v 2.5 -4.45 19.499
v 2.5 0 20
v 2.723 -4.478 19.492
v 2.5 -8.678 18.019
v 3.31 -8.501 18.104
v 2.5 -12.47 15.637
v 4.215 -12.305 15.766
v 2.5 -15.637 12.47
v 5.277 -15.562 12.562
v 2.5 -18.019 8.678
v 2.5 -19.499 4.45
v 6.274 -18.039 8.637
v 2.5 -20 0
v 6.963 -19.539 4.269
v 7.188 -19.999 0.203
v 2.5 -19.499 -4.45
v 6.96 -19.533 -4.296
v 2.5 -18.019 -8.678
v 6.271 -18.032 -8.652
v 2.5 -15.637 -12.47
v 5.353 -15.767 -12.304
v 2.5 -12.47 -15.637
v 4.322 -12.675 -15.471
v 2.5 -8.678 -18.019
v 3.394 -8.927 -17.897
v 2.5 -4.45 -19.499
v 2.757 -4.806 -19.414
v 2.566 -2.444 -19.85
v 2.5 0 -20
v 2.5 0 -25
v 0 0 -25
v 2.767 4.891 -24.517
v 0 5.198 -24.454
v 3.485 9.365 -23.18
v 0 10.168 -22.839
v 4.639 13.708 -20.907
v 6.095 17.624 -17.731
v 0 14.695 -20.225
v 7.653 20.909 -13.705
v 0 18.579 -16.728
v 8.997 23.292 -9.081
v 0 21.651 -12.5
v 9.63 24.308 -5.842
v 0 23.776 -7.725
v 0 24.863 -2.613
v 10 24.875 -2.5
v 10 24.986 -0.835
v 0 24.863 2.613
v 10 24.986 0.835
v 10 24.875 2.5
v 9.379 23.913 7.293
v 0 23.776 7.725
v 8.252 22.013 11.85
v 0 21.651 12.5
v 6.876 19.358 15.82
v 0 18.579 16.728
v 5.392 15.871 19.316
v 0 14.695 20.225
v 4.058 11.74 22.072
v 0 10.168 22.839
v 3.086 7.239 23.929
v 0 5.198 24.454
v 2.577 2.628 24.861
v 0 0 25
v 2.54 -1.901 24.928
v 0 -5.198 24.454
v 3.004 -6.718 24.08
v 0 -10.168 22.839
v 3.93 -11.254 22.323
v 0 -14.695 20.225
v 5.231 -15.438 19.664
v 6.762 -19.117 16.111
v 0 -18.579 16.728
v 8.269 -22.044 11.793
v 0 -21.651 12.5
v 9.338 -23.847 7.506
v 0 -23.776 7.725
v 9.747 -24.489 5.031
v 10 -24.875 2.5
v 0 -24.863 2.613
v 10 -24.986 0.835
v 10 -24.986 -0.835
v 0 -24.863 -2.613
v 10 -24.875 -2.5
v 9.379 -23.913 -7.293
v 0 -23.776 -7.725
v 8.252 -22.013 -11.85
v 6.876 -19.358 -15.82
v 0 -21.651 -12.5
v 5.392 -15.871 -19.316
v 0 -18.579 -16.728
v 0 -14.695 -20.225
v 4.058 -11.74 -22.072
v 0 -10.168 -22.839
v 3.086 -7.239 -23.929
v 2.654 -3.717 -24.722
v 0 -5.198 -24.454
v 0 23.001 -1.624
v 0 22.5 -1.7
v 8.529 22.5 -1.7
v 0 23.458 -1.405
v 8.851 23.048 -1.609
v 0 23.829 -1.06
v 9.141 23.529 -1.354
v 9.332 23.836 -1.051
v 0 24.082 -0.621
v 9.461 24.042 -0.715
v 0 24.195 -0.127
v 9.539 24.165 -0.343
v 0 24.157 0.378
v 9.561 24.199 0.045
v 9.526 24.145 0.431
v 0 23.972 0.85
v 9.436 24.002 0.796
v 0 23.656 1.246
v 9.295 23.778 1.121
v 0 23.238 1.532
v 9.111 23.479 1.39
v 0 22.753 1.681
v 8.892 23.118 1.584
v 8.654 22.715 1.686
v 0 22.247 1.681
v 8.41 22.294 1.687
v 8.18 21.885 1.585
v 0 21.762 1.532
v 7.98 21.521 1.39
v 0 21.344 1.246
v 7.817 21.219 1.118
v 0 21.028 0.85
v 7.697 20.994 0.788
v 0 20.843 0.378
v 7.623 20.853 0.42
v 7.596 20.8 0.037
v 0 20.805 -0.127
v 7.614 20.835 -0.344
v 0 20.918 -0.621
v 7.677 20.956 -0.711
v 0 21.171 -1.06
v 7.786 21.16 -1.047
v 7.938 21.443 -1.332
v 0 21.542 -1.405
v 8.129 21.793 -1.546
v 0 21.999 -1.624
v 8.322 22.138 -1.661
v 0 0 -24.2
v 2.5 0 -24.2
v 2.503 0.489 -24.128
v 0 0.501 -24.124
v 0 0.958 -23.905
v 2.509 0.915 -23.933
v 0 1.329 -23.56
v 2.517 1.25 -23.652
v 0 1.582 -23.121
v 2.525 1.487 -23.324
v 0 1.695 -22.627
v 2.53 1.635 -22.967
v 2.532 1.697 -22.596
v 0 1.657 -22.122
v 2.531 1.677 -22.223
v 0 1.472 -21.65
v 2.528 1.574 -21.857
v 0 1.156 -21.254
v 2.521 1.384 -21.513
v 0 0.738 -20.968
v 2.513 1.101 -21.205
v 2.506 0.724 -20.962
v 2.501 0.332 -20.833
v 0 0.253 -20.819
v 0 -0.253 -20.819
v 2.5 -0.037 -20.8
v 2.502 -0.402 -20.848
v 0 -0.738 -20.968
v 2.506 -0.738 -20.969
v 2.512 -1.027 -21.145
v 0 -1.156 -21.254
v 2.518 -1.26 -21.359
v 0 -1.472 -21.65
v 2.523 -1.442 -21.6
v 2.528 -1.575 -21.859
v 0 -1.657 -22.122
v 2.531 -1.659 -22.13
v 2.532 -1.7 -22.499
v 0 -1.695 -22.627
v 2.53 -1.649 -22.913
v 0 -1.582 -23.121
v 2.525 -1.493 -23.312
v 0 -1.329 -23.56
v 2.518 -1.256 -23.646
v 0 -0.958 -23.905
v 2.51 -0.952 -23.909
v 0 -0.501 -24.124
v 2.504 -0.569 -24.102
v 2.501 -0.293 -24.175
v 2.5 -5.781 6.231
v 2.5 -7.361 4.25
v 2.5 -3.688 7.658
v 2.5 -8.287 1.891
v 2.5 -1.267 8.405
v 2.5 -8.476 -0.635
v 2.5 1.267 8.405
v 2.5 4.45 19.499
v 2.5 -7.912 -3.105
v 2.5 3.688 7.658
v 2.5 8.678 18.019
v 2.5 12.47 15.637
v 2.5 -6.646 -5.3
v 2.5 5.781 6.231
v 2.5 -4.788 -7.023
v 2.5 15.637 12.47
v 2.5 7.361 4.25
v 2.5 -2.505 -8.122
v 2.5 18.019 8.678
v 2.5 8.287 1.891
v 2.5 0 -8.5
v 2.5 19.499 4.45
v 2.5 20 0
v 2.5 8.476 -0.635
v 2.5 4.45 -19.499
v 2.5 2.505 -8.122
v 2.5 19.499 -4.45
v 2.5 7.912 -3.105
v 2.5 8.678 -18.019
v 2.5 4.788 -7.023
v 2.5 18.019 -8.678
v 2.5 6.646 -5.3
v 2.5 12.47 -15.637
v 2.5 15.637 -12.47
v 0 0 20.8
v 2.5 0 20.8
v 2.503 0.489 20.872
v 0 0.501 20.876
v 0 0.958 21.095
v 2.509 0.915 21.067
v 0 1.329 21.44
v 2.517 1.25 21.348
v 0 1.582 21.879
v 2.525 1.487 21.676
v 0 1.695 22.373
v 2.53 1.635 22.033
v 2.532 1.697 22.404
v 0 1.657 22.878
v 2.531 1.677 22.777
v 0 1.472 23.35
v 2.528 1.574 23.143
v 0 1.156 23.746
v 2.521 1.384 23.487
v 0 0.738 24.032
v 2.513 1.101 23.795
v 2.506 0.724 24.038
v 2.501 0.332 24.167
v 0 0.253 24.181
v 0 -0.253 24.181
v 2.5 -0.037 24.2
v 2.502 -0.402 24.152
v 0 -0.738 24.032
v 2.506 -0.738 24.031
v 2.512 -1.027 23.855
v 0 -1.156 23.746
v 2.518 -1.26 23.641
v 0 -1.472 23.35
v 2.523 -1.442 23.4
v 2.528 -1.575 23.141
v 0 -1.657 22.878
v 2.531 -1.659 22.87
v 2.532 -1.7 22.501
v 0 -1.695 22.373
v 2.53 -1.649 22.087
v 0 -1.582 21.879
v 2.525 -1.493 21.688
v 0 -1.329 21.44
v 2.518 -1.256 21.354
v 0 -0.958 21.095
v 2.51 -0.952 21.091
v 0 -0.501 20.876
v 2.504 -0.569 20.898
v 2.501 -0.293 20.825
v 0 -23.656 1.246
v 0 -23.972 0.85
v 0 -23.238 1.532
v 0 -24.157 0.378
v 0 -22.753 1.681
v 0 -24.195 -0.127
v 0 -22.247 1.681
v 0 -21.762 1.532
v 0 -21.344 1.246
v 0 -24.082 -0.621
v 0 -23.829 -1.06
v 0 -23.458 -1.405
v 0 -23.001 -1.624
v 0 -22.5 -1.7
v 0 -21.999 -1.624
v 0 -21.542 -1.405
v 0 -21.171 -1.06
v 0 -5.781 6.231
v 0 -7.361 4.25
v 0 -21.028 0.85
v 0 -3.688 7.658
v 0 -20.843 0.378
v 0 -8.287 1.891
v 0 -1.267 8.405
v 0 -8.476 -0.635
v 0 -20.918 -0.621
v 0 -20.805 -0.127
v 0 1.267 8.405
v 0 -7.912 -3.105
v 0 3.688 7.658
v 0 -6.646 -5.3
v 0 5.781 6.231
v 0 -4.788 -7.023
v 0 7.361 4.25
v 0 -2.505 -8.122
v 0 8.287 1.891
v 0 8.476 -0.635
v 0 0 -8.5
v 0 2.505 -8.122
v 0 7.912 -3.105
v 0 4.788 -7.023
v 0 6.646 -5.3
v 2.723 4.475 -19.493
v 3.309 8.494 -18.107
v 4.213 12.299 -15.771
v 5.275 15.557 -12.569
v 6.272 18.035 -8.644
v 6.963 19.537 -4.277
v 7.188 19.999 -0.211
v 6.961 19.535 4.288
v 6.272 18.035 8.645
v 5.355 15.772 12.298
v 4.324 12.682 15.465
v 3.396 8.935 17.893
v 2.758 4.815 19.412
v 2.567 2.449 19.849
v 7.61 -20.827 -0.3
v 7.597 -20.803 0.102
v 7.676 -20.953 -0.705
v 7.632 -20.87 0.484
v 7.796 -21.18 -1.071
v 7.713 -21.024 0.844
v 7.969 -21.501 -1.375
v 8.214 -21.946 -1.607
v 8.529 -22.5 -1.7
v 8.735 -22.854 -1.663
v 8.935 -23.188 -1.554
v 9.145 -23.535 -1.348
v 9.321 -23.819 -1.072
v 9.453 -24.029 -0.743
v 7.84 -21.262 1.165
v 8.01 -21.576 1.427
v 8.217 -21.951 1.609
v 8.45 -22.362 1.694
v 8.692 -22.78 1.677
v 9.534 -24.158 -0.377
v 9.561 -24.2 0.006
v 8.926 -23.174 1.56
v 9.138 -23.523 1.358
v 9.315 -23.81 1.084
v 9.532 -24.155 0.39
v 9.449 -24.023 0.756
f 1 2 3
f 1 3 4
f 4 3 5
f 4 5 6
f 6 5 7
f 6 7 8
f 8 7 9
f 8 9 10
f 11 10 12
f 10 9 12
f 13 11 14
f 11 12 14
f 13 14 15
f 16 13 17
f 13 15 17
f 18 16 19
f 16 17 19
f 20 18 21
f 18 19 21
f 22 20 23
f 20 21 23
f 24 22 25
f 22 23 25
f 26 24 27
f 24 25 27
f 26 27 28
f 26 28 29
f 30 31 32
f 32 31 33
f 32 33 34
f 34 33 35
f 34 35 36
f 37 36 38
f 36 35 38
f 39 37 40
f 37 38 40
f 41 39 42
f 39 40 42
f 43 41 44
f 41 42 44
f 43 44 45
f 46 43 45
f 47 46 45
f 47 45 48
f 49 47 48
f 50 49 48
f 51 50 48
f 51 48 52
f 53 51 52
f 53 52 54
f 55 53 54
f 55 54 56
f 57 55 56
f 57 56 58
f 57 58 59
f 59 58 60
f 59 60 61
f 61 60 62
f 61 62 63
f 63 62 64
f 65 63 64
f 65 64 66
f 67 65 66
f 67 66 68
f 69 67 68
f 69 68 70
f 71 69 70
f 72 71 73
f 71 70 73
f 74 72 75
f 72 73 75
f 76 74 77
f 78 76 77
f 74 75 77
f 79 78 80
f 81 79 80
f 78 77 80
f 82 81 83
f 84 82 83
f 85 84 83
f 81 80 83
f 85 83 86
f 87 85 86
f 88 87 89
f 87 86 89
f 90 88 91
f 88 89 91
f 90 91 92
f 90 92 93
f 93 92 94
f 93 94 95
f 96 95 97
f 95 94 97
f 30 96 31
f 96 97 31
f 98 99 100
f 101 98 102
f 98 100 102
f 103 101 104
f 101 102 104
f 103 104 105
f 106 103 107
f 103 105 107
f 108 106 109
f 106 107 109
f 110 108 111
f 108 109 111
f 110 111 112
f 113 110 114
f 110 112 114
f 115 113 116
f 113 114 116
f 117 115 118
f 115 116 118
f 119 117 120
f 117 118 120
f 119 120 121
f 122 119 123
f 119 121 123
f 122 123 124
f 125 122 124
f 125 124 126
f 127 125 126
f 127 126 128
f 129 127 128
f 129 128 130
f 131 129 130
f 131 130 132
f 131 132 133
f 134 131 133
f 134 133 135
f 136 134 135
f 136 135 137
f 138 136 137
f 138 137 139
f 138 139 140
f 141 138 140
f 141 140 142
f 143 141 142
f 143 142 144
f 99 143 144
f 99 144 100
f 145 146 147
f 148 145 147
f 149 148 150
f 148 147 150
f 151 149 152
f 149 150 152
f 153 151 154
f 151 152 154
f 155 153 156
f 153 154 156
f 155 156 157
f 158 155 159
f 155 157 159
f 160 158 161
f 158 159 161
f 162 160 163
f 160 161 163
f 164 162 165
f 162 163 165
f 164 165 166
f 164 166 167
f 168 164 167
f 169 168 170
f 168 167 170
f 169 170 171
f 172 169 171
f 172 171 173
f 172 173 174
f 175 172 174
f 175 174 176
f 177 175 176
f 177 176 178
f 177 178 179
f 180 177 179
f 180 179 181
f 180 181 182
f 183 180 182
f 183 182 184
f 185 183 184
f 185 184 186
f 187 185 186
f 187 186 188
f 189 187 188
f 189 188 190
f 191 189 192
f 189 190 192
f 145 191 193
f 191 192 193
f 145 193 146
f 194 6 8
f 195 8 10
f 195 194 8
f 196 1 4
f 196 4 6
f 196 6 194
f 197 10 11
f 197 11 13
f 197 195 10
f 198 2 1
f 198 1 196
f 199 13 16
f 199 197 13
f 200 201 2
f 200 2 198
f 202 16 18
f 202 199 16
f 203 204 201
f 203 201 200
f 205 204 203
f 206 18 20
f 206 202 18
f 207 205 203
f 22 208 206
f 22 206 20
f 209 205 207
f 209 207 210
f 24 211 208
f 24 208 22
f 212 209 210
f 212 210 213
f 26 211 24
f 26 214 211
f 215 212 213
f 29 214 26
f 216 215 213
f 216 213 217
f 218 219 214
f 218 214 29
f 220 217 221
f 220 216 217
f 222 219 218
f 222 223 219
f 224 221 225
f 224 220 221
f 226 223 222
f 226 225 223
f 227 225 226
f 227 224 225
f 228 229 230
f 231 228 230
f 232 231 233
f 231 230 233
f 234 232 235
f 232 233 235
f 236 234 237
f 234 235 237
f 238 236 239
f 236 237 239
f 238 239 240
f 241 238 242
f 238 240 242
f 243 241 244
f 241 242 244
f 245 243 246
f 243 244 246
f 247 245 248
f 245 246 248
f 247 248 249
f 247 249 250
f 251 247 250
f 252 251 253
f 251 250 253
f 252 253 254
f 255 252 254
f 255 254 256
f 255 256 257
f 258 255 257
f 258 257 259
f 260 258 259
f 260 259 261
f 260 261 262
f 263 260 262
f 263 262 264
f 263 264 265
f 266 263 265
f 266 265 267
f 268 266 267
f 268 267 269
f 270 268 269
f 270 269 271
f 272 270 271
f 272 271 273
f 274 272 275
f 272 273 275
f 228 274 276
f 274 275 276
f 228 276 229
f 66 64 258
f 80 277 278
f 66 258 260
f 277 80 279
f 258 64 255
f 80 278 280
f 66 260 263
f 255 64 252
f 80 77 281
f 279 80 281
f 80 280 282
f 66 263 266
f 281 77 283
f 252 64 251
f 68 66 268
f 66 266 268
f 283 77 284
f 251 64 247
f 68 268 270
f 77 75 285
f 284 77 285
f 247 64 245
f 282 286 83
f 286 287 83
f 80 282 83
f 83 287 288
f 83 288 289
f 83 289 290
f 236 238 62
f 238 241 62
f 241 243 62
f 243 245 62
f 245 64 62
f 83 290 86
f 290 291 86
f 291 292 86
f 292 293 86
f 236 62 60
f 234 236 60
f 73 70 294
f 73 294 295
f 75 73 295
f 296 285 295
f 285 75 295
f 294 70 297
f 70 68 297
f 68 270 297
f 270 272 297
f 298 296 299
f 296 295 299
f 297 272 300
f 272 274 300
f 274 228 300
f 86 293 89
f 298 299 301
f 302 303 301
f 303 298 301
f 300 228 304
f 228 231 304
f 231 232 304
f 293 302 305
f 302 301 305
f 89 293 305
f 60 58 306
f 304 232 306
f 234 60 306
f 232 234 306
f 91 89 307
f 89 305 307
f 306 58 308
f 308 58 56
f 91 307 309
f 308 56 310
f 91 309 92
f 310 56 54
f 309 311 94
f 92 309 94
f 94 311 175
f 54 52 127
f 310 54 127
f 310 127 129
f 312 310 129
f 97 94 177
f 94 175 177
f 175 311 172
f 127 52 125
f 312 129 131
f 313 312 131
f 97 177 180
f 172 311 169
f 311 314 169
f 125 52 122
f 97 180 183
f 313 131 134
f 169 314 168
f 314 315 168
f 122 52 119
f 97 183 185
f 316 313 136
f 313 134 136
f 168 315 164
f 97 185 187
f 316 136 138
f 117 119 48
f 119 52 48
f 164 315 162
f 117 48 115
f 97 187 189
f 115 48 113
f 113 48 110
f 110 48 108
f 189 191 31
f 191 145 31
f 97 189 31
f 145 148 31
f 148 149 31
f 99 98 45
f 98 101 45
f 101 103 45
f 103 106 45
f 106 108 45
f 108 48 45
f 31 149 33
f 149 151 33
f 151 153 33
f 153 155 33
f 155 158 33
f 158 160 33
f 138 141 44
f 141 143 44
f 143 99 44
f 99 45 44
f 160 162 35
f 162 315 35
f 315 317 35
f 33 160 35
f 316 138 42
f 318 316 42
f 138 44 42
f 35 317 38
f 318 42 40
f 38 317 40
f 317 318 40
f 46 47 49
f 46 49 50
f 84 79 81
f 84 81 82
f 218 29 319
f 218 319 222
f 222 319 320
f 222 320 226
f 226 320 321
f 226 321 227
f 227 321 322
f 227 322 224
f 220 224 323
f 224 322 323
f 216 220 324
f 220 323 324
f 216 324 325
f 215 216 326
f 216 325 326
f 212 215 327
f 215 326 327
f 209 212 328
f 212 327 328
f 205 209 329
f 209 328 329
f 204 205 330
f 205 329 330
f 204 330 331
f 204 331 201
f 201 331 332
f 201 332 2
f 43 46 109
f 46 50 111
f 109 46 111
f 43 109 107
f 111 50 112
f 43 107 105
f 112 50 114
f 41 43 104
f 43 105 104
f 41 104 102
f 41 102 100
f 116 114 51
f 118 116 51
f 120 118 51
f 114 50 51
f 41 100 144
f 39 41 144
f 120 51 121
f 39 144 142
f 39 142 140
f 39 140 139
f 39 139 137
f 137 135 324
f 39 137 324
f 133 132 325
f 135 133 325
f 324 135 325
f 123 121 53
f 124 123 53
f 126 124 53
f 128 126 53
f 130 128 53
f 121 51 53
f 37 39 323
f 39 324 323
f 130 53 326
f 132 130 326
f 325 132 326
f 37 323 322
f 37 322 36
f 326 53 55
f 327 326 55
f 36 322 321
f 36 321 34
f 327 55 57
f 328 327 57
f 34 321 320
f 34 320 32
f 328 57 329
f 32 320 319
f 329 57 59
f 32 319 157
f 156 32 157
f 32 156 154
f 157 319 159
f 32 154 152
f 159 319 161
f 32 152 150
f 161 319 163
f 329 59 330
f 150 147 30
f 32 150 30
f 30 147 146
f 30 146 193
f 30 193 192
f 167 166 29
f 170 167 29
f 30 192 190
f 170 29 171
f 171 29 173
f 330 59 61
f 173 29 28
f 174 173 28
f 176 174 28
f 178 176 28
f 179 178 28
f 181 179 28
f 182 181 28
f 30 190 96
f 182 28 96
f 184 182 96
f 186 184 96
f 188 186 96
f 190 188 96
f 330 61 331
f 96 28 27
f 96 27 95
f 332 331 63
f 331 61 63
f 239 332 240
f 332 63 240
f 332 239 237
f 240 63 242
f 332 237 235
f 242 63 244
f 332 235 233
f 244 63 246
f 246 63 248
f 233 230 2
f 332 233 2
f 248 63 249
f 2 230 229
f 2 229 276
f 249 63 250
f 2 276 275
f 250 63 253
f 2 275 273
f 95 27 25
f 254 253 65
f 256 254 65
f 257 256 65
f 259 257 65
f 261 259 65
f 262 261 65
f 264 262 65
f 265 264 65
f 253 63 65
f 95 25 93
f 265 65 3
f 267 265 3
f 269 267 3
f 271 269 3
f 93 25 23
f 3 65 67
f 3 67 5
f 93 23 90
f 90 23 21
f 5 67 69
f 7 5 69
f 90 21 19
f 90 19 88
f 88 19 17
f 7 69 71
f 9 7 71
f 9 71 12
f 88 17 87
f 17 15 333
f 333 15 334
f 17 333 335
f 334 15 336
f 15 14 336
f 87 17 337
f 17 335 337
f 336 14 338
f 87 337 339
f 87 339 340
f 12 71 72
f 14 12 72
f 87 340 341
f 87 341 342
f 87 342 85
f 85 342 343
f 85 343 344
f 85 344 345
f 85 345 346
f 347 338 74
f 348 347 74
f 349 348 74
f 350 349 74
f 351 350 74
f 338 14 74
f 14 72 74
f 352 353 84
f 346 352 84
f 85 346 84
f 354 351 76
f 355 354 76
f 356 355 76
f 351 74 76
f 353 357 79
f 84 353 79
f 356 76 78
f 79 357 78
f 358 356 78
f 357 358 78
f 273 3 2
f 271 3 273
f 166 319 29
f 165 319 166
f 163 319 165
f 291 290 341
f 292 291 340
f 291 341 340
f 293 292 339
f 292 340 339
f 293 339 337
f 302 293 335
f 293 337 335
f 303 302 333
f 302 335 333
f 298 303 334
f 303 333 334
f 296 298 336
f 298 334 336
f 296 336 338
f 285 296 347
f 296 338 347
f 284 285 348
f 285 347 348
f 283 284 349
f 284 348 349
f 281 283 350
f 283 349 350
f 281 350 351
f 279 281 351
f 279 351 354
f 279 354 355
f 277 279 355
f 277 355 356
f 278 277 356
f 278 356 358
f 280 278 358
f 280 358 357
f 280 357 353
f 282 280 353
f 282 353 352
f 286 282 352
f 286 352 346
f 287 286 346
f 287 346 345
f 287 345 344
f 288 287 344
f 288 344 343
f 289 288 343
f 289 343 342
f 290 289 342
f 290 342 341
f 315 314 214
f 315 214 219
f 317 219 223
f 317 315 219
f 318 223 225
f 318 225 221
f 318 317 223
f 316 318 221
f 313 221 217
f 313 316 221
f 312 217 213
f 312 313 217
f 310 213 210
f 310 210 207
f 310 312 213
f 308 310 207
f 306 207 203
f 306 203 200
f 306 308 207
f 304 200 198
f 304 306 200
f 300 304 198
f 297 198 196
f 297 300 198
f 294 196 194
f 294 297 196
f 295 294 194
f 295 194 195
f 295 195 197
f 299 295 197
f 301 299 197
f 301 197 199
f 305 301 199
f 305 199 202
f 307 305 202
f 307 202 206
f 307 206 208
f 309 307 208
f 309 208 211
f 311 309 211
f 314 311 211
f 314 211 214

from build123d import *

# Parameters (mm, degrees)
SKETCH2_R                = 25
SKETCH2_R_2              = 8.5
BOSS_EXTRUDE1_DEPTH      = 10
SKETCH3_R                = 45
CUT_EXTRUDE3_DEPTH       = 29
CUT_EXTRUDE3_DEPTH_BACK  = 28
SKETCH5_R                = 20.000026056
CUT_EXTRUDE4_DEPTH       = 7.5
M3_CLEARANCE_HOLE1_D     = 3.4
M3_CLEARANCE_HOLE1_DEPTH = 70
M3_CLEARANCE_HOLE1_TIP   = 1.021463052


with BuildPart() as part:
    # Sketch2 → Boss-Extrude1 (new body)
    with BuildSketch(Plane(origin=(0, 0, 0), x_dir=(0, 0, -1), z_dir=(1, 0, 0))):
        Circle(SKETCH2_R)
        Circle(SKETCH2_R_2, mode=Mode.SUBTRACT)
    extrude(amount=BOSS_EXTRUDE1_DEPTH)

    # Sketch3 → Cut-Extrude3 (cut, two sides)
    with BuildSketch(Plane.XY) as cut_extrude3_sk:
        with Locations((47.5, 0)):
            Circle(SKETCH3_R)
    extrude(amount=CUT_EXTRUDE3_DEPTH, mode=Mode.SUBTRACT)
    extrude(cut_extrude3_sk.sketch, amount=-CUT_EXTRUDE3_DEPTH_BACK, mode=Mode.SUBTRACT)

    # Sketch5 → Cut-Extrude4 (cut)
    with BuildSketch(Plane(origin=(10, 0, 0), x_dir=(0, 0, -1), z_dir=(1, 0, 0))):
        Circle(SKETCH5_R)
    extrude(amount=-CUT_EXTRUDE4_DEPTH, mode=Mode.SUBTRACT)

    # M3 Clearance Hole1
    with Locations(Plane.ZY):
        with Locations((22.5, 0), (0, 22.5), (-22.5, 0), (0, -22.5)):
            Hole(M3_CLEARANCE_HOLE1_D / 2, depth=M3_CLEARANCE_HOLE1_DEPTH)
            with Locations((0, 0, -(M3_CLEARANCE_HOLE1_DEPTH + M3_CLEARANCE_HOLE1_TIP / 2))):  # 118° drill point
                Cone(0, M3_CLEARANCE_HOLE1_D / 2, M3_CLEARANCE_HOLE1_TIP, mode=Mode.SUBTRACT)


solid = part.part
